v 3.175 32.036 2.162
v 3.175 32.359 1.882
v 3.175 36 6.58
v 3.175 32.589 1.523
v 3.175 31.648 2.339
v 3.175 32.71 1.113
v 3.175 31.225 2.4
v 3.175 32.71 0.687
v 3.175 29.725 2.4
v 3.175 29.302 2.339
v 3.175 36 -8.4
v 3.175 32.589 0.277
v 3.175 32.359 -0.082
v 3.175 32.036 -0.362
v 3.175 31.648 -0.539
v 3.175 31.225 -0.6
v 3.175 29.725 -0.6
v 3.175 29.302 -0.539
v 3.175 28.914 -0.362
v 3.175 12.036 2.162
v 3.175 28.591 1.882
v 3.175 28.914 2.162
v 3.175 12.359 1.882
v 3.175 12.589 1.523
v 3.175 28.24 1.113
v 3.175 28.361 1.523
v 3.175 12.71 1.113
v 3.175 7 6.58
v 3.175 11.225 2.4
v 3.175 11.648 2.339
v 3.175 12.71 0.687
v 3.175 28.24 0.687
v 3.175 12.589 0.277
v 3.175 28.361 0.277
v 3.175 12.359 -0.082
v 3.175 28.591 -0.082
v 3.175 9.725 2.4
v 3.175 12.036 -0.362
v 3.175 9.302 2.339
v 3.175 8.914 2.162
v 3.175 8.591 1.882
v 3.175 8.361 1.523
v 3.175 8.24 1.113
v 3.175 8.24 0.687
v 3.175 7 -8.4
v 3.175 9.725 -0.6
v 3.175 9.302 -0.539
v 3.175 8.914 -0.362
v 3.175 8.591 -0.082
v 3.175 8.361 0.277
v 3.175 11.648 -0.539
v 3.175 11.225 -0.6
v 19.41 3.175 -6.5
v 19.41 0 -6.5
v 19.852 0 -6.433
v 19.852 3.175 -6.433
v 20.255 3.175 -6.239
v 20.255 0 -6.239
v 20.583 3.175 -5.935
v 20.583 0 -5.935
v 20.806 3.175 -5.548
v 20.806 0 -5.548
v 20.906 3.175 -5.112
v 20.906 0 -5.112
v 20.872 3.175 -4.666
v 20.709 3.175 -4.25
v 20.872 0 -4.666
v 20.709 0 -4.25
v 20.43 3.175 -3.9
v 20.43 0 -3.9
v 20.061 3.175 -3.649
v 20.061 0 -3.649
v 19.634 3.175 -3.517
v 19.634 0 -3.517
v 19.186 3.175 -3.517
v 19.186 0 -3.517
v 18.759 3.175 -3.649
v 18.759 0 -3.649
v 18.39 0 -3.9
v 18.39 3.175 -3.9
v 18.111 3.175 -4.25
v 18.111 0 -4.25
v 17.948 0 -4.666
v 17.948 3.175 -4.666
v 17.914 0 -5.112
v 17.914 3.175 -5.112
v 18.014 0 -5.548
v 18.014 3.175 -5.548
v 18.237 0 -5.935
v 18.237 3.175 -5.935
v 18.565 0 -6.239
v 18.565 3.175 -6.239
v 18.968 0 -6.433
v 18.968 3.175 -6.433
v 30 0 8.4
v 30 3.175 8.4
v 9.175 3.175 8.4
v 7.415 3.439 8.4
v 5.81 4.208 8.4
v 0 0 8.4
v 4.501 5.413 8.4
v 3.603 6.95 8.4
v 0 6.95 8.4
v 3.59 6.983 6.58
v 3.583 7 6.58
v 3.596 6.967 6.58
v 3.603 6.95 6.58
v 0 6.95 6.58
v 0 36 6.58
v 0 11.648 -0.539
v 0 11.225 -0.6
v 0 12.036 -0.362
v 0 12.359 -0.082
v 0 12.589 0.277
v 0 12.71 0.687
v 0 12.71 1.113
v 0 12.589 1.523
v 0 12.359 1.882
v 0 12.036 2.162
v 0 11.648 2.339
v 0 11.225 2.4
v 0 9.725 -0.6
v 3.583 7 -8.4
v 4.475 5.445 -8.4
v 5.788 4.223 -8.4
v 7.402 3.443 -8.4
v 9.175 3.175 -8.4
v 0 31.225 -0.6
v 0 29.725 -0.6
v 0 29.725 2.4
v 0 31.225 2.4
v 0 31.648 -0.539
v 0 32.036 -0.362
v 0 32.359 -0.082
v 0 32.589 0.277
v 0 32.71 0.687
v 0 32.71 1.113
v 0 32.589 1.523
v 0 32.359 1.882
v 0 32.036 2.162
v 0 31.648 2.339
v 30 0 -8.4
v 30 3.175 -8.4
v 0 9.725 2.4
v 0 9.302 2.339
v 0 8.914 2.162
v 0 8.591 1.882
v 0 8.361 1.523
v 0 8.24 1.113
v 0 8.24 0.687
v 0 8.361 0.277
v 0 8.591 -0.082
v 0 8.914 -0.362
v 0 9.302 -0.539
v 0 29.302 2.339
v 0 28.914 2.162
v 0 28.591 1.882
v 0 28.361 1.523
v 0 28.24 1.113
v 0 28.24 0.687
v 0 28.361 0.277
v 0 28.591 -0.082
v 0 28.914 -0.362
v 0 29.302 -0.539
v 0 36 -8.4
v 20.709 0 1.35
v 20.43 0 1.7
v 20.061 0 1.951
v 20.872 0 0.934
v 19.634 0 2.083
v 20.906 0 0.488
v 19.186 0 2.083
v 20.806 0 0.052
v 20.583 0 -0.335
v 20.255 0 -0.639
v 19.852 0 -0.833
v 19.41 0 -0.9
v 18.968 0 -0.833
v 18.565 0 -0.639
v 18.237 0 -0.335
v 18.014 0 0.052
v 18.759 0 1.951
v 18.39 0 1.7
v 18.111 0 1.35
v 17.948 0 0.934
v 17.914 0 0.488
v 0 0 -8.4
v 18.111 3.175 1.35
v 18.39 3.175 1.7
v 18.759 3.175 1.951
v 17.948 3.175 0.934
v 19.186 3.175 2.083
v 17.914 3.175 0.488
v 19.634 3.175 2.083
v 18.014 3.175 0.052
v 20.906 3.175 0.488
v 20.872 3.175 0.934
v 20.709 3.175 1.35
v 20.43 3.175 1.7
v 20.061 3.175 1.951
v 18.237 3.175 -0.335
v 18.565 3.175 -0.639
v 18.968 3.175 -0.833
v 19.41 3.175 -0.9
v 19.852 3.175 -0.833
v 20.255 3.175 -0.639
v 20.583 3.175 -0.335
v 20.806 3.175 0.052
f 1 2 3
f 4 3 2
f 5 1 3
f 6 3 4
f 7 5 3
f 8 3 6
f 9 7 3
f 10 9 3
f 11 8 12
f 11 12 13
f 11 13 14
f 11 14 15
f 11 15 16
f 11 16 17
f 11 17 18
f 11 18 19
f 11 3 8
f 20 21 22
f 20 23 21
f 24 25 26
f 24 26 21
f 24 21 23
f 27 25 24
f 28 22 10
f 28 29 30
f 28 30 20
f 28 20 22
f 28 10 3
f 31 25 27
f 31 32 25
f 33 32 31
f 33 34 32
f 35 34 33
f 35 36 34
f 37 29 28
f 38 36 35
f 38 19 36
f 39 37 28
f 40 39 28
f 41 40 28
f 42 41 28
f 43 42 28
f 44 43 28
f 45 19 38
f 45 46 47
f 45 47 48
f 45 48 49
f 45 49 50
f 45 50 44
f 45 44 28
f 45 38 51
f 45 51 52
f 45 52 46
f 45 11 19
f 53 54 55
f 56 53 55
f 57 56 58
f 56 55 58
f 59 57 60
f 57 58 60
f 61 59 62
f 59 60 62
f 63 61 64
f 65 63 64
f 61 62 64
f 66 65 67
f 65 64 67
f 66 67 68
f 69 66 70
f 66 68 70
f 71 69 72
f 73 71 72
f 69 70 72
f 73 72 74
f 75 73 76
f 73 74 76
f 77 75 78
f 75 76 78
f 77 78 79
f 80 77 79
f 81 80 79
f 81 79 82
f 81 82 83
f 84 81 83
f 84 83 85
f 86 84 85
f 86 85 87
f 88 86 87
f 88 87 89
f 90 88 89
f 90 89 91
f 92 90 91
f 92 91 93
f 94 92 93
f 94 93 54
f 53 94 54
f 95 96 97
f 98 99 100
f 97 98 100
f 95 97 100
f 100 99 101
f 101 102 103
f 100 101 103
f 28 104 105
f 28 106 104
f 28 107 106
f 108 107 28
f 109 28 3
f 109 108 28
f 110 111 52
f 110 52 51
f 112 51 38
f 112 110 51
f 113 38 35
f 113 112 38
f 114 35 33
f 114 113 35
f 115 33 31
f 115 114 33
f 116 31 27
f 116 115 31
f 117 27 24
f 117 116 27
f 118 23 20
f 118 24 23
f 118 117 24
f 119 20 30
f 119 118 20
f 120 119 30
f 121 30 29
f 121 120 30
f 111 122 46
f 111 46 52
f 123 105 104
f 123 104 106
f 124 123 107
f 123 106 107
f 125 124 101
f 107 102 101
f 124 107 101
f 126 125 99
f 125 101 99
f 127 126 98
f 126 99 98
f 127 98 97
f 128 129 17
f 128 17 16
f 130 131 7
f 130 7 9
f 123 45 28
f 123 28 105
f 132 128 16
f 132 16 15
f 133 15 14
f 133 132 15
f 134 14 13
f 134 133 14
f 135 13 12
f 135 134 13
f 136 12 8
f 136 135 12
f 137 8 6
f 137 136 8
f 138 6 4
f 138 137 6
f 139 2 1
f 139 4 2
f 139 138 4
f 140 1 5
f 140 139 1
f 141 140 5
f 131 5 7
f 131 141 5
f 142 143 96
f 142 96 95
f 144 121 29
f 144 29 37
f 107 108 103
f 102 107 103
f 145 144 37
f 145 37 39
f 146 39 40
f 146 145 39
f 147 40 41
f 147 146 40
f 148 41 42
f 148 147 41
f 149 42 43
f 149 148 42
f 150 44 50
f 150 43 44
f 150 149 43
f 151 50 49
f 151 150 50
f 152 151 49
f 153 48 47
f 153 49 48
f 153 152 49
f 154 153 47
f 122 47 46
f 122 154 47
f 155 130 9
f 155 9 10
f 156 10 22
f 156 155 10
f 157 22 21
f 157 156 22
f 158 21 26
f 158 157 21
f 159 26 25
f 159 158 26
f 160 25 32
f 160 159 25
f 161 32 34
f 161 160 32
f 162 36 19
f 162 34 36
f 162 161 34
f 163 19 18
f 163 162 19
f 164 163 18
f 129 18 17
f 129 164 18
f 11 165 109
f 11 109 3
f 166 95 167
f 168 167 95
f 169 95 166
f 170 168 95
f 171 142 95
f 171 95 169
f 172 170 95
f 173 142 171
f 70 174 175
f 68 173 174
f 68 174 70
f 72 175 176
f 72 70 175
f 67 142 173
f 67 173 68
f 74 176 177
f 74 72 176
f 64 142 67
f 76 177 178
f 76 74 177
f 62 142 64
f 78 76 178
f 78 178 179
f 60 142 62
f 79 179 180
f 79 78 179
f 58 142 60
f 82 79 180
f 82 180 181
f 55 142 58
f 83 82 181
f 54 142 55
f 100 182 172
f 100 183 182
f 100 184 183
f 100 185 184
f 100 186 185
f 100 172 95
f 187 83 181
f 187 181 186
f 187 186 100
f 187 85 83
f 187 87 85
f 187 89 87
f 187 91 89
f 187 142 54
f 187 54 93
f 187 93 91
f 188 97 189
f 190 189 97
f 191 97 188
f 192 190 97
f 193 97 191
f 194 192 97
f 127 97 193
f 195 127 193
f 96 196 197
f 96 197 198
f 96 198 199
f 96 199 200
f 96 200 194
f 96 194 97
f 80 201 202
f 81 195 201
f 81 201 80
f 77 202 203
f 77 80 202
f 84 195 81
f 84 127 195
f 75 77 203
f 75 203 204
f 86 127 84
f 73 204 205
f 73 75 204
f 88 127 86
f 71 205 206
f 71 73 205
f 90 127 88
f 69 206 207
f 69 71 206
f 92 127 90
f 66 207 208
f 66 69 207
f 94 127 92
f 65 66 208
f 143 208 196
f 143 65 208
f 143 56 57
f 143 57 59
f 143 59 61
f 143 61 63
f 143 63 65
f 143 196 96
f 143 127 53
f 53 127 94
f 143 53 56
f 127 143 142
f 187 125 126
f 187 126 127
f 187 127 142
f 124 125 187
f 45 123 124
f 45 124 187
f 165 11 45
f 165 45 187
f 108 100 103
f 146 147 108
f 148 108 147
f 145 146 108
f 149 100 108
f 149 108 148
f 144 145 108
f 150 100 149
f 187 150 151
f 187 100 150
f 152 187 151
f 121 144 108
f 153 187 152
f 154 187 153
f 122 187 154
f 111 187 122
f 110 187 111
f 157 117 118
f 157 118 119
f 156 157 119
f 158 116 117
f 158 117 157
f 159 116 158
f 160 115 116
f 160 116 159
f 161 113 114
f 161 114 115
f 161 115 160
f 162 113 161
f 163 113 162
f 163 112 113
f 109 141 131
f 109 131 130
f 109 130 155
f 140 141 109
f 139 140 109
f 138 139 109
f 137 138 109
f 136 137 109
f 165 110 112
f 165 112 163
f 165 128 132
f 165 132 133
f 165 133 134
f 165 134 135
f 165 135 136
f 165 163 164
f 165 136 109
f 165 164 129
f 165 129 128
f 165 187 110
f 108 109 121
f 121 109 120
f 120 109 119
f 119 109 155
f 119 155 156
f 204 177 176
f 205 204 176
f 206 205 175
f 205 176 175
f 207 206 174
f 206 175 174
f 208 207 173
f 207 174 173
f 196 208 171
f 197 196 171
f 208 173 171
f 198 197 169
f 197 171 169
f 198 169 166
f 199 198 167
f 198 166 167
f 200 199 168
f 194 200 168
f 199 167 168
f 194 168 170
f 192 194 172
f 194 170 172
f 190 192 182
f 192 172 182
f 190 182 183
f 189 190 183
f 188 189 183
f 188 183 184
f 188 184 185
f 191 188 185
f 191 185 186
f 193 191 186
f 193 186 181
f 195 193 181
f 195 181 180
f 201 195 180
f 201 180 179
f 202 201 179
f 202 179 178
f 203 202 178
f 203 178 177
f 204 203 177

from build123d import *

# Parameters (mm, degrees)
BOSS_EXTRUDE1_DEPTH      = 8.4
BOSS_EXTRUDE1_DEPTH_BACK = 8.4
FILLET1_R                = 6
CUT_EXTRUDE2_DEPTH       = 10
CUT_EXTRUDE1_DEPTH       = 10
CUT_EXTRUDE1_DEPTH_BACK  = 10
SKETCH3_W                = 1
SKETCH3_H                = 7.737404144
SKETCH5_R                = 1.5
CUT_EXTRUDE3_DEPTH       = 7
SKETCH6_W                = 1.82
SKETCH6_H                = 29.05
CUT_EXTRUDE4_DEPTH       = 7


with BuildPart() as part:
    # Sketch1 → Boss-Extrude1 (new, two sides: drawn at the far end of the back side and taken through both)
    with BuildSketch(Plane.XY.offset(-BOSS_EXTRUDE1_DEPTH_BACK)):
        Polygon((0, 0), (0, 36), (3.175, 36), (3.175, 3.175), (30, 3.175), (30, 0), align=None)
    extrude(amount=BOSS_EXTRUDE1_DEPTH + BOSS_EXTRUDE1_DEPTH_BACK)

    # Fillet1
    fillet1_edges = [part.edges().sort_by_distance(p)[0] for p in [
        (3.175, 3.175, 0),
    ]]
    fillet(fillet1_edges, radius=FILLET1_R)

    # Sketch4 → Cut-Extrude2 (cut)
    with BuildSketch(Plane.ZY):
        with BuildLine():
            Line((2.4, 31.225), (2.4, 29.725))
            ThreePointArc((2.4, 29.725), (0.9, 28.225), (-0.6, 29.725))
            Line((-0.6, 29.725), (-0.6, 31.225))
            ThreePointArc((-0.6, 31.225), (0.9, 32.725), (2.4, 31.225))
        make_face()
        with BuildLine():
            Line((-0.6, 9.725), (-0.6, 11.225))
            ThreePointArc((-0.6, 11.225), (0.9, 12.725), (2.4, 11.225))
            Line((2.4, 11.225), (2.4, 9.725))
            ThreePointArc((2.4, 9.725), (0.9, 8.225), (-0.6, 9.725))
        make_face()
    extrude(amount=-CUT_EXTRUDE2_DEPTH, mode=Mode.SUBTRACT)

    # Sketch3 → Cut-Extrude1 (cut, two sides: drawn at the far end of the back side and taken through both)
    with BuildSketch(Plane.XY.offset(-CUT_EXTRUDE1_DEPTH_BACK)):
        with Locations((3.675, 10.868702072)):
            Rectangle(SKETCH3_W, SKETCH3_H)
    extrude(amount=CUT_EXTRUDE1_DEPTH + CUT_EXTRUDE1_DEPTH_BACK, mode=Mode.SUBTRACT)

    # Sketch5 → Cut-Extrude3 (cut)
    with BuildSketch(Plane.XZ):
        with Locations((19.41, 0.6)):
            Circle(SKETCH5_R)
        with Locations((19.41, -5)):
            Circle(SKETCH5_R)
    extrude(amount=-CUT_EXTRUDE3_DEPTH, mode=Mode.SUBTRACT)

    # Sketch6 → Cut-Extrude4 (cut)
    with BuildSketch(Plane.ZY):
        with Locations((7.49, 21.475)):
            Rectangle(SKETCH6_W, SKETCH6_H)
    extrude(amount=-CUT_EXTRUDE4_DEPTH, mode=Mode.SUBTRACT)


solid = part.part
